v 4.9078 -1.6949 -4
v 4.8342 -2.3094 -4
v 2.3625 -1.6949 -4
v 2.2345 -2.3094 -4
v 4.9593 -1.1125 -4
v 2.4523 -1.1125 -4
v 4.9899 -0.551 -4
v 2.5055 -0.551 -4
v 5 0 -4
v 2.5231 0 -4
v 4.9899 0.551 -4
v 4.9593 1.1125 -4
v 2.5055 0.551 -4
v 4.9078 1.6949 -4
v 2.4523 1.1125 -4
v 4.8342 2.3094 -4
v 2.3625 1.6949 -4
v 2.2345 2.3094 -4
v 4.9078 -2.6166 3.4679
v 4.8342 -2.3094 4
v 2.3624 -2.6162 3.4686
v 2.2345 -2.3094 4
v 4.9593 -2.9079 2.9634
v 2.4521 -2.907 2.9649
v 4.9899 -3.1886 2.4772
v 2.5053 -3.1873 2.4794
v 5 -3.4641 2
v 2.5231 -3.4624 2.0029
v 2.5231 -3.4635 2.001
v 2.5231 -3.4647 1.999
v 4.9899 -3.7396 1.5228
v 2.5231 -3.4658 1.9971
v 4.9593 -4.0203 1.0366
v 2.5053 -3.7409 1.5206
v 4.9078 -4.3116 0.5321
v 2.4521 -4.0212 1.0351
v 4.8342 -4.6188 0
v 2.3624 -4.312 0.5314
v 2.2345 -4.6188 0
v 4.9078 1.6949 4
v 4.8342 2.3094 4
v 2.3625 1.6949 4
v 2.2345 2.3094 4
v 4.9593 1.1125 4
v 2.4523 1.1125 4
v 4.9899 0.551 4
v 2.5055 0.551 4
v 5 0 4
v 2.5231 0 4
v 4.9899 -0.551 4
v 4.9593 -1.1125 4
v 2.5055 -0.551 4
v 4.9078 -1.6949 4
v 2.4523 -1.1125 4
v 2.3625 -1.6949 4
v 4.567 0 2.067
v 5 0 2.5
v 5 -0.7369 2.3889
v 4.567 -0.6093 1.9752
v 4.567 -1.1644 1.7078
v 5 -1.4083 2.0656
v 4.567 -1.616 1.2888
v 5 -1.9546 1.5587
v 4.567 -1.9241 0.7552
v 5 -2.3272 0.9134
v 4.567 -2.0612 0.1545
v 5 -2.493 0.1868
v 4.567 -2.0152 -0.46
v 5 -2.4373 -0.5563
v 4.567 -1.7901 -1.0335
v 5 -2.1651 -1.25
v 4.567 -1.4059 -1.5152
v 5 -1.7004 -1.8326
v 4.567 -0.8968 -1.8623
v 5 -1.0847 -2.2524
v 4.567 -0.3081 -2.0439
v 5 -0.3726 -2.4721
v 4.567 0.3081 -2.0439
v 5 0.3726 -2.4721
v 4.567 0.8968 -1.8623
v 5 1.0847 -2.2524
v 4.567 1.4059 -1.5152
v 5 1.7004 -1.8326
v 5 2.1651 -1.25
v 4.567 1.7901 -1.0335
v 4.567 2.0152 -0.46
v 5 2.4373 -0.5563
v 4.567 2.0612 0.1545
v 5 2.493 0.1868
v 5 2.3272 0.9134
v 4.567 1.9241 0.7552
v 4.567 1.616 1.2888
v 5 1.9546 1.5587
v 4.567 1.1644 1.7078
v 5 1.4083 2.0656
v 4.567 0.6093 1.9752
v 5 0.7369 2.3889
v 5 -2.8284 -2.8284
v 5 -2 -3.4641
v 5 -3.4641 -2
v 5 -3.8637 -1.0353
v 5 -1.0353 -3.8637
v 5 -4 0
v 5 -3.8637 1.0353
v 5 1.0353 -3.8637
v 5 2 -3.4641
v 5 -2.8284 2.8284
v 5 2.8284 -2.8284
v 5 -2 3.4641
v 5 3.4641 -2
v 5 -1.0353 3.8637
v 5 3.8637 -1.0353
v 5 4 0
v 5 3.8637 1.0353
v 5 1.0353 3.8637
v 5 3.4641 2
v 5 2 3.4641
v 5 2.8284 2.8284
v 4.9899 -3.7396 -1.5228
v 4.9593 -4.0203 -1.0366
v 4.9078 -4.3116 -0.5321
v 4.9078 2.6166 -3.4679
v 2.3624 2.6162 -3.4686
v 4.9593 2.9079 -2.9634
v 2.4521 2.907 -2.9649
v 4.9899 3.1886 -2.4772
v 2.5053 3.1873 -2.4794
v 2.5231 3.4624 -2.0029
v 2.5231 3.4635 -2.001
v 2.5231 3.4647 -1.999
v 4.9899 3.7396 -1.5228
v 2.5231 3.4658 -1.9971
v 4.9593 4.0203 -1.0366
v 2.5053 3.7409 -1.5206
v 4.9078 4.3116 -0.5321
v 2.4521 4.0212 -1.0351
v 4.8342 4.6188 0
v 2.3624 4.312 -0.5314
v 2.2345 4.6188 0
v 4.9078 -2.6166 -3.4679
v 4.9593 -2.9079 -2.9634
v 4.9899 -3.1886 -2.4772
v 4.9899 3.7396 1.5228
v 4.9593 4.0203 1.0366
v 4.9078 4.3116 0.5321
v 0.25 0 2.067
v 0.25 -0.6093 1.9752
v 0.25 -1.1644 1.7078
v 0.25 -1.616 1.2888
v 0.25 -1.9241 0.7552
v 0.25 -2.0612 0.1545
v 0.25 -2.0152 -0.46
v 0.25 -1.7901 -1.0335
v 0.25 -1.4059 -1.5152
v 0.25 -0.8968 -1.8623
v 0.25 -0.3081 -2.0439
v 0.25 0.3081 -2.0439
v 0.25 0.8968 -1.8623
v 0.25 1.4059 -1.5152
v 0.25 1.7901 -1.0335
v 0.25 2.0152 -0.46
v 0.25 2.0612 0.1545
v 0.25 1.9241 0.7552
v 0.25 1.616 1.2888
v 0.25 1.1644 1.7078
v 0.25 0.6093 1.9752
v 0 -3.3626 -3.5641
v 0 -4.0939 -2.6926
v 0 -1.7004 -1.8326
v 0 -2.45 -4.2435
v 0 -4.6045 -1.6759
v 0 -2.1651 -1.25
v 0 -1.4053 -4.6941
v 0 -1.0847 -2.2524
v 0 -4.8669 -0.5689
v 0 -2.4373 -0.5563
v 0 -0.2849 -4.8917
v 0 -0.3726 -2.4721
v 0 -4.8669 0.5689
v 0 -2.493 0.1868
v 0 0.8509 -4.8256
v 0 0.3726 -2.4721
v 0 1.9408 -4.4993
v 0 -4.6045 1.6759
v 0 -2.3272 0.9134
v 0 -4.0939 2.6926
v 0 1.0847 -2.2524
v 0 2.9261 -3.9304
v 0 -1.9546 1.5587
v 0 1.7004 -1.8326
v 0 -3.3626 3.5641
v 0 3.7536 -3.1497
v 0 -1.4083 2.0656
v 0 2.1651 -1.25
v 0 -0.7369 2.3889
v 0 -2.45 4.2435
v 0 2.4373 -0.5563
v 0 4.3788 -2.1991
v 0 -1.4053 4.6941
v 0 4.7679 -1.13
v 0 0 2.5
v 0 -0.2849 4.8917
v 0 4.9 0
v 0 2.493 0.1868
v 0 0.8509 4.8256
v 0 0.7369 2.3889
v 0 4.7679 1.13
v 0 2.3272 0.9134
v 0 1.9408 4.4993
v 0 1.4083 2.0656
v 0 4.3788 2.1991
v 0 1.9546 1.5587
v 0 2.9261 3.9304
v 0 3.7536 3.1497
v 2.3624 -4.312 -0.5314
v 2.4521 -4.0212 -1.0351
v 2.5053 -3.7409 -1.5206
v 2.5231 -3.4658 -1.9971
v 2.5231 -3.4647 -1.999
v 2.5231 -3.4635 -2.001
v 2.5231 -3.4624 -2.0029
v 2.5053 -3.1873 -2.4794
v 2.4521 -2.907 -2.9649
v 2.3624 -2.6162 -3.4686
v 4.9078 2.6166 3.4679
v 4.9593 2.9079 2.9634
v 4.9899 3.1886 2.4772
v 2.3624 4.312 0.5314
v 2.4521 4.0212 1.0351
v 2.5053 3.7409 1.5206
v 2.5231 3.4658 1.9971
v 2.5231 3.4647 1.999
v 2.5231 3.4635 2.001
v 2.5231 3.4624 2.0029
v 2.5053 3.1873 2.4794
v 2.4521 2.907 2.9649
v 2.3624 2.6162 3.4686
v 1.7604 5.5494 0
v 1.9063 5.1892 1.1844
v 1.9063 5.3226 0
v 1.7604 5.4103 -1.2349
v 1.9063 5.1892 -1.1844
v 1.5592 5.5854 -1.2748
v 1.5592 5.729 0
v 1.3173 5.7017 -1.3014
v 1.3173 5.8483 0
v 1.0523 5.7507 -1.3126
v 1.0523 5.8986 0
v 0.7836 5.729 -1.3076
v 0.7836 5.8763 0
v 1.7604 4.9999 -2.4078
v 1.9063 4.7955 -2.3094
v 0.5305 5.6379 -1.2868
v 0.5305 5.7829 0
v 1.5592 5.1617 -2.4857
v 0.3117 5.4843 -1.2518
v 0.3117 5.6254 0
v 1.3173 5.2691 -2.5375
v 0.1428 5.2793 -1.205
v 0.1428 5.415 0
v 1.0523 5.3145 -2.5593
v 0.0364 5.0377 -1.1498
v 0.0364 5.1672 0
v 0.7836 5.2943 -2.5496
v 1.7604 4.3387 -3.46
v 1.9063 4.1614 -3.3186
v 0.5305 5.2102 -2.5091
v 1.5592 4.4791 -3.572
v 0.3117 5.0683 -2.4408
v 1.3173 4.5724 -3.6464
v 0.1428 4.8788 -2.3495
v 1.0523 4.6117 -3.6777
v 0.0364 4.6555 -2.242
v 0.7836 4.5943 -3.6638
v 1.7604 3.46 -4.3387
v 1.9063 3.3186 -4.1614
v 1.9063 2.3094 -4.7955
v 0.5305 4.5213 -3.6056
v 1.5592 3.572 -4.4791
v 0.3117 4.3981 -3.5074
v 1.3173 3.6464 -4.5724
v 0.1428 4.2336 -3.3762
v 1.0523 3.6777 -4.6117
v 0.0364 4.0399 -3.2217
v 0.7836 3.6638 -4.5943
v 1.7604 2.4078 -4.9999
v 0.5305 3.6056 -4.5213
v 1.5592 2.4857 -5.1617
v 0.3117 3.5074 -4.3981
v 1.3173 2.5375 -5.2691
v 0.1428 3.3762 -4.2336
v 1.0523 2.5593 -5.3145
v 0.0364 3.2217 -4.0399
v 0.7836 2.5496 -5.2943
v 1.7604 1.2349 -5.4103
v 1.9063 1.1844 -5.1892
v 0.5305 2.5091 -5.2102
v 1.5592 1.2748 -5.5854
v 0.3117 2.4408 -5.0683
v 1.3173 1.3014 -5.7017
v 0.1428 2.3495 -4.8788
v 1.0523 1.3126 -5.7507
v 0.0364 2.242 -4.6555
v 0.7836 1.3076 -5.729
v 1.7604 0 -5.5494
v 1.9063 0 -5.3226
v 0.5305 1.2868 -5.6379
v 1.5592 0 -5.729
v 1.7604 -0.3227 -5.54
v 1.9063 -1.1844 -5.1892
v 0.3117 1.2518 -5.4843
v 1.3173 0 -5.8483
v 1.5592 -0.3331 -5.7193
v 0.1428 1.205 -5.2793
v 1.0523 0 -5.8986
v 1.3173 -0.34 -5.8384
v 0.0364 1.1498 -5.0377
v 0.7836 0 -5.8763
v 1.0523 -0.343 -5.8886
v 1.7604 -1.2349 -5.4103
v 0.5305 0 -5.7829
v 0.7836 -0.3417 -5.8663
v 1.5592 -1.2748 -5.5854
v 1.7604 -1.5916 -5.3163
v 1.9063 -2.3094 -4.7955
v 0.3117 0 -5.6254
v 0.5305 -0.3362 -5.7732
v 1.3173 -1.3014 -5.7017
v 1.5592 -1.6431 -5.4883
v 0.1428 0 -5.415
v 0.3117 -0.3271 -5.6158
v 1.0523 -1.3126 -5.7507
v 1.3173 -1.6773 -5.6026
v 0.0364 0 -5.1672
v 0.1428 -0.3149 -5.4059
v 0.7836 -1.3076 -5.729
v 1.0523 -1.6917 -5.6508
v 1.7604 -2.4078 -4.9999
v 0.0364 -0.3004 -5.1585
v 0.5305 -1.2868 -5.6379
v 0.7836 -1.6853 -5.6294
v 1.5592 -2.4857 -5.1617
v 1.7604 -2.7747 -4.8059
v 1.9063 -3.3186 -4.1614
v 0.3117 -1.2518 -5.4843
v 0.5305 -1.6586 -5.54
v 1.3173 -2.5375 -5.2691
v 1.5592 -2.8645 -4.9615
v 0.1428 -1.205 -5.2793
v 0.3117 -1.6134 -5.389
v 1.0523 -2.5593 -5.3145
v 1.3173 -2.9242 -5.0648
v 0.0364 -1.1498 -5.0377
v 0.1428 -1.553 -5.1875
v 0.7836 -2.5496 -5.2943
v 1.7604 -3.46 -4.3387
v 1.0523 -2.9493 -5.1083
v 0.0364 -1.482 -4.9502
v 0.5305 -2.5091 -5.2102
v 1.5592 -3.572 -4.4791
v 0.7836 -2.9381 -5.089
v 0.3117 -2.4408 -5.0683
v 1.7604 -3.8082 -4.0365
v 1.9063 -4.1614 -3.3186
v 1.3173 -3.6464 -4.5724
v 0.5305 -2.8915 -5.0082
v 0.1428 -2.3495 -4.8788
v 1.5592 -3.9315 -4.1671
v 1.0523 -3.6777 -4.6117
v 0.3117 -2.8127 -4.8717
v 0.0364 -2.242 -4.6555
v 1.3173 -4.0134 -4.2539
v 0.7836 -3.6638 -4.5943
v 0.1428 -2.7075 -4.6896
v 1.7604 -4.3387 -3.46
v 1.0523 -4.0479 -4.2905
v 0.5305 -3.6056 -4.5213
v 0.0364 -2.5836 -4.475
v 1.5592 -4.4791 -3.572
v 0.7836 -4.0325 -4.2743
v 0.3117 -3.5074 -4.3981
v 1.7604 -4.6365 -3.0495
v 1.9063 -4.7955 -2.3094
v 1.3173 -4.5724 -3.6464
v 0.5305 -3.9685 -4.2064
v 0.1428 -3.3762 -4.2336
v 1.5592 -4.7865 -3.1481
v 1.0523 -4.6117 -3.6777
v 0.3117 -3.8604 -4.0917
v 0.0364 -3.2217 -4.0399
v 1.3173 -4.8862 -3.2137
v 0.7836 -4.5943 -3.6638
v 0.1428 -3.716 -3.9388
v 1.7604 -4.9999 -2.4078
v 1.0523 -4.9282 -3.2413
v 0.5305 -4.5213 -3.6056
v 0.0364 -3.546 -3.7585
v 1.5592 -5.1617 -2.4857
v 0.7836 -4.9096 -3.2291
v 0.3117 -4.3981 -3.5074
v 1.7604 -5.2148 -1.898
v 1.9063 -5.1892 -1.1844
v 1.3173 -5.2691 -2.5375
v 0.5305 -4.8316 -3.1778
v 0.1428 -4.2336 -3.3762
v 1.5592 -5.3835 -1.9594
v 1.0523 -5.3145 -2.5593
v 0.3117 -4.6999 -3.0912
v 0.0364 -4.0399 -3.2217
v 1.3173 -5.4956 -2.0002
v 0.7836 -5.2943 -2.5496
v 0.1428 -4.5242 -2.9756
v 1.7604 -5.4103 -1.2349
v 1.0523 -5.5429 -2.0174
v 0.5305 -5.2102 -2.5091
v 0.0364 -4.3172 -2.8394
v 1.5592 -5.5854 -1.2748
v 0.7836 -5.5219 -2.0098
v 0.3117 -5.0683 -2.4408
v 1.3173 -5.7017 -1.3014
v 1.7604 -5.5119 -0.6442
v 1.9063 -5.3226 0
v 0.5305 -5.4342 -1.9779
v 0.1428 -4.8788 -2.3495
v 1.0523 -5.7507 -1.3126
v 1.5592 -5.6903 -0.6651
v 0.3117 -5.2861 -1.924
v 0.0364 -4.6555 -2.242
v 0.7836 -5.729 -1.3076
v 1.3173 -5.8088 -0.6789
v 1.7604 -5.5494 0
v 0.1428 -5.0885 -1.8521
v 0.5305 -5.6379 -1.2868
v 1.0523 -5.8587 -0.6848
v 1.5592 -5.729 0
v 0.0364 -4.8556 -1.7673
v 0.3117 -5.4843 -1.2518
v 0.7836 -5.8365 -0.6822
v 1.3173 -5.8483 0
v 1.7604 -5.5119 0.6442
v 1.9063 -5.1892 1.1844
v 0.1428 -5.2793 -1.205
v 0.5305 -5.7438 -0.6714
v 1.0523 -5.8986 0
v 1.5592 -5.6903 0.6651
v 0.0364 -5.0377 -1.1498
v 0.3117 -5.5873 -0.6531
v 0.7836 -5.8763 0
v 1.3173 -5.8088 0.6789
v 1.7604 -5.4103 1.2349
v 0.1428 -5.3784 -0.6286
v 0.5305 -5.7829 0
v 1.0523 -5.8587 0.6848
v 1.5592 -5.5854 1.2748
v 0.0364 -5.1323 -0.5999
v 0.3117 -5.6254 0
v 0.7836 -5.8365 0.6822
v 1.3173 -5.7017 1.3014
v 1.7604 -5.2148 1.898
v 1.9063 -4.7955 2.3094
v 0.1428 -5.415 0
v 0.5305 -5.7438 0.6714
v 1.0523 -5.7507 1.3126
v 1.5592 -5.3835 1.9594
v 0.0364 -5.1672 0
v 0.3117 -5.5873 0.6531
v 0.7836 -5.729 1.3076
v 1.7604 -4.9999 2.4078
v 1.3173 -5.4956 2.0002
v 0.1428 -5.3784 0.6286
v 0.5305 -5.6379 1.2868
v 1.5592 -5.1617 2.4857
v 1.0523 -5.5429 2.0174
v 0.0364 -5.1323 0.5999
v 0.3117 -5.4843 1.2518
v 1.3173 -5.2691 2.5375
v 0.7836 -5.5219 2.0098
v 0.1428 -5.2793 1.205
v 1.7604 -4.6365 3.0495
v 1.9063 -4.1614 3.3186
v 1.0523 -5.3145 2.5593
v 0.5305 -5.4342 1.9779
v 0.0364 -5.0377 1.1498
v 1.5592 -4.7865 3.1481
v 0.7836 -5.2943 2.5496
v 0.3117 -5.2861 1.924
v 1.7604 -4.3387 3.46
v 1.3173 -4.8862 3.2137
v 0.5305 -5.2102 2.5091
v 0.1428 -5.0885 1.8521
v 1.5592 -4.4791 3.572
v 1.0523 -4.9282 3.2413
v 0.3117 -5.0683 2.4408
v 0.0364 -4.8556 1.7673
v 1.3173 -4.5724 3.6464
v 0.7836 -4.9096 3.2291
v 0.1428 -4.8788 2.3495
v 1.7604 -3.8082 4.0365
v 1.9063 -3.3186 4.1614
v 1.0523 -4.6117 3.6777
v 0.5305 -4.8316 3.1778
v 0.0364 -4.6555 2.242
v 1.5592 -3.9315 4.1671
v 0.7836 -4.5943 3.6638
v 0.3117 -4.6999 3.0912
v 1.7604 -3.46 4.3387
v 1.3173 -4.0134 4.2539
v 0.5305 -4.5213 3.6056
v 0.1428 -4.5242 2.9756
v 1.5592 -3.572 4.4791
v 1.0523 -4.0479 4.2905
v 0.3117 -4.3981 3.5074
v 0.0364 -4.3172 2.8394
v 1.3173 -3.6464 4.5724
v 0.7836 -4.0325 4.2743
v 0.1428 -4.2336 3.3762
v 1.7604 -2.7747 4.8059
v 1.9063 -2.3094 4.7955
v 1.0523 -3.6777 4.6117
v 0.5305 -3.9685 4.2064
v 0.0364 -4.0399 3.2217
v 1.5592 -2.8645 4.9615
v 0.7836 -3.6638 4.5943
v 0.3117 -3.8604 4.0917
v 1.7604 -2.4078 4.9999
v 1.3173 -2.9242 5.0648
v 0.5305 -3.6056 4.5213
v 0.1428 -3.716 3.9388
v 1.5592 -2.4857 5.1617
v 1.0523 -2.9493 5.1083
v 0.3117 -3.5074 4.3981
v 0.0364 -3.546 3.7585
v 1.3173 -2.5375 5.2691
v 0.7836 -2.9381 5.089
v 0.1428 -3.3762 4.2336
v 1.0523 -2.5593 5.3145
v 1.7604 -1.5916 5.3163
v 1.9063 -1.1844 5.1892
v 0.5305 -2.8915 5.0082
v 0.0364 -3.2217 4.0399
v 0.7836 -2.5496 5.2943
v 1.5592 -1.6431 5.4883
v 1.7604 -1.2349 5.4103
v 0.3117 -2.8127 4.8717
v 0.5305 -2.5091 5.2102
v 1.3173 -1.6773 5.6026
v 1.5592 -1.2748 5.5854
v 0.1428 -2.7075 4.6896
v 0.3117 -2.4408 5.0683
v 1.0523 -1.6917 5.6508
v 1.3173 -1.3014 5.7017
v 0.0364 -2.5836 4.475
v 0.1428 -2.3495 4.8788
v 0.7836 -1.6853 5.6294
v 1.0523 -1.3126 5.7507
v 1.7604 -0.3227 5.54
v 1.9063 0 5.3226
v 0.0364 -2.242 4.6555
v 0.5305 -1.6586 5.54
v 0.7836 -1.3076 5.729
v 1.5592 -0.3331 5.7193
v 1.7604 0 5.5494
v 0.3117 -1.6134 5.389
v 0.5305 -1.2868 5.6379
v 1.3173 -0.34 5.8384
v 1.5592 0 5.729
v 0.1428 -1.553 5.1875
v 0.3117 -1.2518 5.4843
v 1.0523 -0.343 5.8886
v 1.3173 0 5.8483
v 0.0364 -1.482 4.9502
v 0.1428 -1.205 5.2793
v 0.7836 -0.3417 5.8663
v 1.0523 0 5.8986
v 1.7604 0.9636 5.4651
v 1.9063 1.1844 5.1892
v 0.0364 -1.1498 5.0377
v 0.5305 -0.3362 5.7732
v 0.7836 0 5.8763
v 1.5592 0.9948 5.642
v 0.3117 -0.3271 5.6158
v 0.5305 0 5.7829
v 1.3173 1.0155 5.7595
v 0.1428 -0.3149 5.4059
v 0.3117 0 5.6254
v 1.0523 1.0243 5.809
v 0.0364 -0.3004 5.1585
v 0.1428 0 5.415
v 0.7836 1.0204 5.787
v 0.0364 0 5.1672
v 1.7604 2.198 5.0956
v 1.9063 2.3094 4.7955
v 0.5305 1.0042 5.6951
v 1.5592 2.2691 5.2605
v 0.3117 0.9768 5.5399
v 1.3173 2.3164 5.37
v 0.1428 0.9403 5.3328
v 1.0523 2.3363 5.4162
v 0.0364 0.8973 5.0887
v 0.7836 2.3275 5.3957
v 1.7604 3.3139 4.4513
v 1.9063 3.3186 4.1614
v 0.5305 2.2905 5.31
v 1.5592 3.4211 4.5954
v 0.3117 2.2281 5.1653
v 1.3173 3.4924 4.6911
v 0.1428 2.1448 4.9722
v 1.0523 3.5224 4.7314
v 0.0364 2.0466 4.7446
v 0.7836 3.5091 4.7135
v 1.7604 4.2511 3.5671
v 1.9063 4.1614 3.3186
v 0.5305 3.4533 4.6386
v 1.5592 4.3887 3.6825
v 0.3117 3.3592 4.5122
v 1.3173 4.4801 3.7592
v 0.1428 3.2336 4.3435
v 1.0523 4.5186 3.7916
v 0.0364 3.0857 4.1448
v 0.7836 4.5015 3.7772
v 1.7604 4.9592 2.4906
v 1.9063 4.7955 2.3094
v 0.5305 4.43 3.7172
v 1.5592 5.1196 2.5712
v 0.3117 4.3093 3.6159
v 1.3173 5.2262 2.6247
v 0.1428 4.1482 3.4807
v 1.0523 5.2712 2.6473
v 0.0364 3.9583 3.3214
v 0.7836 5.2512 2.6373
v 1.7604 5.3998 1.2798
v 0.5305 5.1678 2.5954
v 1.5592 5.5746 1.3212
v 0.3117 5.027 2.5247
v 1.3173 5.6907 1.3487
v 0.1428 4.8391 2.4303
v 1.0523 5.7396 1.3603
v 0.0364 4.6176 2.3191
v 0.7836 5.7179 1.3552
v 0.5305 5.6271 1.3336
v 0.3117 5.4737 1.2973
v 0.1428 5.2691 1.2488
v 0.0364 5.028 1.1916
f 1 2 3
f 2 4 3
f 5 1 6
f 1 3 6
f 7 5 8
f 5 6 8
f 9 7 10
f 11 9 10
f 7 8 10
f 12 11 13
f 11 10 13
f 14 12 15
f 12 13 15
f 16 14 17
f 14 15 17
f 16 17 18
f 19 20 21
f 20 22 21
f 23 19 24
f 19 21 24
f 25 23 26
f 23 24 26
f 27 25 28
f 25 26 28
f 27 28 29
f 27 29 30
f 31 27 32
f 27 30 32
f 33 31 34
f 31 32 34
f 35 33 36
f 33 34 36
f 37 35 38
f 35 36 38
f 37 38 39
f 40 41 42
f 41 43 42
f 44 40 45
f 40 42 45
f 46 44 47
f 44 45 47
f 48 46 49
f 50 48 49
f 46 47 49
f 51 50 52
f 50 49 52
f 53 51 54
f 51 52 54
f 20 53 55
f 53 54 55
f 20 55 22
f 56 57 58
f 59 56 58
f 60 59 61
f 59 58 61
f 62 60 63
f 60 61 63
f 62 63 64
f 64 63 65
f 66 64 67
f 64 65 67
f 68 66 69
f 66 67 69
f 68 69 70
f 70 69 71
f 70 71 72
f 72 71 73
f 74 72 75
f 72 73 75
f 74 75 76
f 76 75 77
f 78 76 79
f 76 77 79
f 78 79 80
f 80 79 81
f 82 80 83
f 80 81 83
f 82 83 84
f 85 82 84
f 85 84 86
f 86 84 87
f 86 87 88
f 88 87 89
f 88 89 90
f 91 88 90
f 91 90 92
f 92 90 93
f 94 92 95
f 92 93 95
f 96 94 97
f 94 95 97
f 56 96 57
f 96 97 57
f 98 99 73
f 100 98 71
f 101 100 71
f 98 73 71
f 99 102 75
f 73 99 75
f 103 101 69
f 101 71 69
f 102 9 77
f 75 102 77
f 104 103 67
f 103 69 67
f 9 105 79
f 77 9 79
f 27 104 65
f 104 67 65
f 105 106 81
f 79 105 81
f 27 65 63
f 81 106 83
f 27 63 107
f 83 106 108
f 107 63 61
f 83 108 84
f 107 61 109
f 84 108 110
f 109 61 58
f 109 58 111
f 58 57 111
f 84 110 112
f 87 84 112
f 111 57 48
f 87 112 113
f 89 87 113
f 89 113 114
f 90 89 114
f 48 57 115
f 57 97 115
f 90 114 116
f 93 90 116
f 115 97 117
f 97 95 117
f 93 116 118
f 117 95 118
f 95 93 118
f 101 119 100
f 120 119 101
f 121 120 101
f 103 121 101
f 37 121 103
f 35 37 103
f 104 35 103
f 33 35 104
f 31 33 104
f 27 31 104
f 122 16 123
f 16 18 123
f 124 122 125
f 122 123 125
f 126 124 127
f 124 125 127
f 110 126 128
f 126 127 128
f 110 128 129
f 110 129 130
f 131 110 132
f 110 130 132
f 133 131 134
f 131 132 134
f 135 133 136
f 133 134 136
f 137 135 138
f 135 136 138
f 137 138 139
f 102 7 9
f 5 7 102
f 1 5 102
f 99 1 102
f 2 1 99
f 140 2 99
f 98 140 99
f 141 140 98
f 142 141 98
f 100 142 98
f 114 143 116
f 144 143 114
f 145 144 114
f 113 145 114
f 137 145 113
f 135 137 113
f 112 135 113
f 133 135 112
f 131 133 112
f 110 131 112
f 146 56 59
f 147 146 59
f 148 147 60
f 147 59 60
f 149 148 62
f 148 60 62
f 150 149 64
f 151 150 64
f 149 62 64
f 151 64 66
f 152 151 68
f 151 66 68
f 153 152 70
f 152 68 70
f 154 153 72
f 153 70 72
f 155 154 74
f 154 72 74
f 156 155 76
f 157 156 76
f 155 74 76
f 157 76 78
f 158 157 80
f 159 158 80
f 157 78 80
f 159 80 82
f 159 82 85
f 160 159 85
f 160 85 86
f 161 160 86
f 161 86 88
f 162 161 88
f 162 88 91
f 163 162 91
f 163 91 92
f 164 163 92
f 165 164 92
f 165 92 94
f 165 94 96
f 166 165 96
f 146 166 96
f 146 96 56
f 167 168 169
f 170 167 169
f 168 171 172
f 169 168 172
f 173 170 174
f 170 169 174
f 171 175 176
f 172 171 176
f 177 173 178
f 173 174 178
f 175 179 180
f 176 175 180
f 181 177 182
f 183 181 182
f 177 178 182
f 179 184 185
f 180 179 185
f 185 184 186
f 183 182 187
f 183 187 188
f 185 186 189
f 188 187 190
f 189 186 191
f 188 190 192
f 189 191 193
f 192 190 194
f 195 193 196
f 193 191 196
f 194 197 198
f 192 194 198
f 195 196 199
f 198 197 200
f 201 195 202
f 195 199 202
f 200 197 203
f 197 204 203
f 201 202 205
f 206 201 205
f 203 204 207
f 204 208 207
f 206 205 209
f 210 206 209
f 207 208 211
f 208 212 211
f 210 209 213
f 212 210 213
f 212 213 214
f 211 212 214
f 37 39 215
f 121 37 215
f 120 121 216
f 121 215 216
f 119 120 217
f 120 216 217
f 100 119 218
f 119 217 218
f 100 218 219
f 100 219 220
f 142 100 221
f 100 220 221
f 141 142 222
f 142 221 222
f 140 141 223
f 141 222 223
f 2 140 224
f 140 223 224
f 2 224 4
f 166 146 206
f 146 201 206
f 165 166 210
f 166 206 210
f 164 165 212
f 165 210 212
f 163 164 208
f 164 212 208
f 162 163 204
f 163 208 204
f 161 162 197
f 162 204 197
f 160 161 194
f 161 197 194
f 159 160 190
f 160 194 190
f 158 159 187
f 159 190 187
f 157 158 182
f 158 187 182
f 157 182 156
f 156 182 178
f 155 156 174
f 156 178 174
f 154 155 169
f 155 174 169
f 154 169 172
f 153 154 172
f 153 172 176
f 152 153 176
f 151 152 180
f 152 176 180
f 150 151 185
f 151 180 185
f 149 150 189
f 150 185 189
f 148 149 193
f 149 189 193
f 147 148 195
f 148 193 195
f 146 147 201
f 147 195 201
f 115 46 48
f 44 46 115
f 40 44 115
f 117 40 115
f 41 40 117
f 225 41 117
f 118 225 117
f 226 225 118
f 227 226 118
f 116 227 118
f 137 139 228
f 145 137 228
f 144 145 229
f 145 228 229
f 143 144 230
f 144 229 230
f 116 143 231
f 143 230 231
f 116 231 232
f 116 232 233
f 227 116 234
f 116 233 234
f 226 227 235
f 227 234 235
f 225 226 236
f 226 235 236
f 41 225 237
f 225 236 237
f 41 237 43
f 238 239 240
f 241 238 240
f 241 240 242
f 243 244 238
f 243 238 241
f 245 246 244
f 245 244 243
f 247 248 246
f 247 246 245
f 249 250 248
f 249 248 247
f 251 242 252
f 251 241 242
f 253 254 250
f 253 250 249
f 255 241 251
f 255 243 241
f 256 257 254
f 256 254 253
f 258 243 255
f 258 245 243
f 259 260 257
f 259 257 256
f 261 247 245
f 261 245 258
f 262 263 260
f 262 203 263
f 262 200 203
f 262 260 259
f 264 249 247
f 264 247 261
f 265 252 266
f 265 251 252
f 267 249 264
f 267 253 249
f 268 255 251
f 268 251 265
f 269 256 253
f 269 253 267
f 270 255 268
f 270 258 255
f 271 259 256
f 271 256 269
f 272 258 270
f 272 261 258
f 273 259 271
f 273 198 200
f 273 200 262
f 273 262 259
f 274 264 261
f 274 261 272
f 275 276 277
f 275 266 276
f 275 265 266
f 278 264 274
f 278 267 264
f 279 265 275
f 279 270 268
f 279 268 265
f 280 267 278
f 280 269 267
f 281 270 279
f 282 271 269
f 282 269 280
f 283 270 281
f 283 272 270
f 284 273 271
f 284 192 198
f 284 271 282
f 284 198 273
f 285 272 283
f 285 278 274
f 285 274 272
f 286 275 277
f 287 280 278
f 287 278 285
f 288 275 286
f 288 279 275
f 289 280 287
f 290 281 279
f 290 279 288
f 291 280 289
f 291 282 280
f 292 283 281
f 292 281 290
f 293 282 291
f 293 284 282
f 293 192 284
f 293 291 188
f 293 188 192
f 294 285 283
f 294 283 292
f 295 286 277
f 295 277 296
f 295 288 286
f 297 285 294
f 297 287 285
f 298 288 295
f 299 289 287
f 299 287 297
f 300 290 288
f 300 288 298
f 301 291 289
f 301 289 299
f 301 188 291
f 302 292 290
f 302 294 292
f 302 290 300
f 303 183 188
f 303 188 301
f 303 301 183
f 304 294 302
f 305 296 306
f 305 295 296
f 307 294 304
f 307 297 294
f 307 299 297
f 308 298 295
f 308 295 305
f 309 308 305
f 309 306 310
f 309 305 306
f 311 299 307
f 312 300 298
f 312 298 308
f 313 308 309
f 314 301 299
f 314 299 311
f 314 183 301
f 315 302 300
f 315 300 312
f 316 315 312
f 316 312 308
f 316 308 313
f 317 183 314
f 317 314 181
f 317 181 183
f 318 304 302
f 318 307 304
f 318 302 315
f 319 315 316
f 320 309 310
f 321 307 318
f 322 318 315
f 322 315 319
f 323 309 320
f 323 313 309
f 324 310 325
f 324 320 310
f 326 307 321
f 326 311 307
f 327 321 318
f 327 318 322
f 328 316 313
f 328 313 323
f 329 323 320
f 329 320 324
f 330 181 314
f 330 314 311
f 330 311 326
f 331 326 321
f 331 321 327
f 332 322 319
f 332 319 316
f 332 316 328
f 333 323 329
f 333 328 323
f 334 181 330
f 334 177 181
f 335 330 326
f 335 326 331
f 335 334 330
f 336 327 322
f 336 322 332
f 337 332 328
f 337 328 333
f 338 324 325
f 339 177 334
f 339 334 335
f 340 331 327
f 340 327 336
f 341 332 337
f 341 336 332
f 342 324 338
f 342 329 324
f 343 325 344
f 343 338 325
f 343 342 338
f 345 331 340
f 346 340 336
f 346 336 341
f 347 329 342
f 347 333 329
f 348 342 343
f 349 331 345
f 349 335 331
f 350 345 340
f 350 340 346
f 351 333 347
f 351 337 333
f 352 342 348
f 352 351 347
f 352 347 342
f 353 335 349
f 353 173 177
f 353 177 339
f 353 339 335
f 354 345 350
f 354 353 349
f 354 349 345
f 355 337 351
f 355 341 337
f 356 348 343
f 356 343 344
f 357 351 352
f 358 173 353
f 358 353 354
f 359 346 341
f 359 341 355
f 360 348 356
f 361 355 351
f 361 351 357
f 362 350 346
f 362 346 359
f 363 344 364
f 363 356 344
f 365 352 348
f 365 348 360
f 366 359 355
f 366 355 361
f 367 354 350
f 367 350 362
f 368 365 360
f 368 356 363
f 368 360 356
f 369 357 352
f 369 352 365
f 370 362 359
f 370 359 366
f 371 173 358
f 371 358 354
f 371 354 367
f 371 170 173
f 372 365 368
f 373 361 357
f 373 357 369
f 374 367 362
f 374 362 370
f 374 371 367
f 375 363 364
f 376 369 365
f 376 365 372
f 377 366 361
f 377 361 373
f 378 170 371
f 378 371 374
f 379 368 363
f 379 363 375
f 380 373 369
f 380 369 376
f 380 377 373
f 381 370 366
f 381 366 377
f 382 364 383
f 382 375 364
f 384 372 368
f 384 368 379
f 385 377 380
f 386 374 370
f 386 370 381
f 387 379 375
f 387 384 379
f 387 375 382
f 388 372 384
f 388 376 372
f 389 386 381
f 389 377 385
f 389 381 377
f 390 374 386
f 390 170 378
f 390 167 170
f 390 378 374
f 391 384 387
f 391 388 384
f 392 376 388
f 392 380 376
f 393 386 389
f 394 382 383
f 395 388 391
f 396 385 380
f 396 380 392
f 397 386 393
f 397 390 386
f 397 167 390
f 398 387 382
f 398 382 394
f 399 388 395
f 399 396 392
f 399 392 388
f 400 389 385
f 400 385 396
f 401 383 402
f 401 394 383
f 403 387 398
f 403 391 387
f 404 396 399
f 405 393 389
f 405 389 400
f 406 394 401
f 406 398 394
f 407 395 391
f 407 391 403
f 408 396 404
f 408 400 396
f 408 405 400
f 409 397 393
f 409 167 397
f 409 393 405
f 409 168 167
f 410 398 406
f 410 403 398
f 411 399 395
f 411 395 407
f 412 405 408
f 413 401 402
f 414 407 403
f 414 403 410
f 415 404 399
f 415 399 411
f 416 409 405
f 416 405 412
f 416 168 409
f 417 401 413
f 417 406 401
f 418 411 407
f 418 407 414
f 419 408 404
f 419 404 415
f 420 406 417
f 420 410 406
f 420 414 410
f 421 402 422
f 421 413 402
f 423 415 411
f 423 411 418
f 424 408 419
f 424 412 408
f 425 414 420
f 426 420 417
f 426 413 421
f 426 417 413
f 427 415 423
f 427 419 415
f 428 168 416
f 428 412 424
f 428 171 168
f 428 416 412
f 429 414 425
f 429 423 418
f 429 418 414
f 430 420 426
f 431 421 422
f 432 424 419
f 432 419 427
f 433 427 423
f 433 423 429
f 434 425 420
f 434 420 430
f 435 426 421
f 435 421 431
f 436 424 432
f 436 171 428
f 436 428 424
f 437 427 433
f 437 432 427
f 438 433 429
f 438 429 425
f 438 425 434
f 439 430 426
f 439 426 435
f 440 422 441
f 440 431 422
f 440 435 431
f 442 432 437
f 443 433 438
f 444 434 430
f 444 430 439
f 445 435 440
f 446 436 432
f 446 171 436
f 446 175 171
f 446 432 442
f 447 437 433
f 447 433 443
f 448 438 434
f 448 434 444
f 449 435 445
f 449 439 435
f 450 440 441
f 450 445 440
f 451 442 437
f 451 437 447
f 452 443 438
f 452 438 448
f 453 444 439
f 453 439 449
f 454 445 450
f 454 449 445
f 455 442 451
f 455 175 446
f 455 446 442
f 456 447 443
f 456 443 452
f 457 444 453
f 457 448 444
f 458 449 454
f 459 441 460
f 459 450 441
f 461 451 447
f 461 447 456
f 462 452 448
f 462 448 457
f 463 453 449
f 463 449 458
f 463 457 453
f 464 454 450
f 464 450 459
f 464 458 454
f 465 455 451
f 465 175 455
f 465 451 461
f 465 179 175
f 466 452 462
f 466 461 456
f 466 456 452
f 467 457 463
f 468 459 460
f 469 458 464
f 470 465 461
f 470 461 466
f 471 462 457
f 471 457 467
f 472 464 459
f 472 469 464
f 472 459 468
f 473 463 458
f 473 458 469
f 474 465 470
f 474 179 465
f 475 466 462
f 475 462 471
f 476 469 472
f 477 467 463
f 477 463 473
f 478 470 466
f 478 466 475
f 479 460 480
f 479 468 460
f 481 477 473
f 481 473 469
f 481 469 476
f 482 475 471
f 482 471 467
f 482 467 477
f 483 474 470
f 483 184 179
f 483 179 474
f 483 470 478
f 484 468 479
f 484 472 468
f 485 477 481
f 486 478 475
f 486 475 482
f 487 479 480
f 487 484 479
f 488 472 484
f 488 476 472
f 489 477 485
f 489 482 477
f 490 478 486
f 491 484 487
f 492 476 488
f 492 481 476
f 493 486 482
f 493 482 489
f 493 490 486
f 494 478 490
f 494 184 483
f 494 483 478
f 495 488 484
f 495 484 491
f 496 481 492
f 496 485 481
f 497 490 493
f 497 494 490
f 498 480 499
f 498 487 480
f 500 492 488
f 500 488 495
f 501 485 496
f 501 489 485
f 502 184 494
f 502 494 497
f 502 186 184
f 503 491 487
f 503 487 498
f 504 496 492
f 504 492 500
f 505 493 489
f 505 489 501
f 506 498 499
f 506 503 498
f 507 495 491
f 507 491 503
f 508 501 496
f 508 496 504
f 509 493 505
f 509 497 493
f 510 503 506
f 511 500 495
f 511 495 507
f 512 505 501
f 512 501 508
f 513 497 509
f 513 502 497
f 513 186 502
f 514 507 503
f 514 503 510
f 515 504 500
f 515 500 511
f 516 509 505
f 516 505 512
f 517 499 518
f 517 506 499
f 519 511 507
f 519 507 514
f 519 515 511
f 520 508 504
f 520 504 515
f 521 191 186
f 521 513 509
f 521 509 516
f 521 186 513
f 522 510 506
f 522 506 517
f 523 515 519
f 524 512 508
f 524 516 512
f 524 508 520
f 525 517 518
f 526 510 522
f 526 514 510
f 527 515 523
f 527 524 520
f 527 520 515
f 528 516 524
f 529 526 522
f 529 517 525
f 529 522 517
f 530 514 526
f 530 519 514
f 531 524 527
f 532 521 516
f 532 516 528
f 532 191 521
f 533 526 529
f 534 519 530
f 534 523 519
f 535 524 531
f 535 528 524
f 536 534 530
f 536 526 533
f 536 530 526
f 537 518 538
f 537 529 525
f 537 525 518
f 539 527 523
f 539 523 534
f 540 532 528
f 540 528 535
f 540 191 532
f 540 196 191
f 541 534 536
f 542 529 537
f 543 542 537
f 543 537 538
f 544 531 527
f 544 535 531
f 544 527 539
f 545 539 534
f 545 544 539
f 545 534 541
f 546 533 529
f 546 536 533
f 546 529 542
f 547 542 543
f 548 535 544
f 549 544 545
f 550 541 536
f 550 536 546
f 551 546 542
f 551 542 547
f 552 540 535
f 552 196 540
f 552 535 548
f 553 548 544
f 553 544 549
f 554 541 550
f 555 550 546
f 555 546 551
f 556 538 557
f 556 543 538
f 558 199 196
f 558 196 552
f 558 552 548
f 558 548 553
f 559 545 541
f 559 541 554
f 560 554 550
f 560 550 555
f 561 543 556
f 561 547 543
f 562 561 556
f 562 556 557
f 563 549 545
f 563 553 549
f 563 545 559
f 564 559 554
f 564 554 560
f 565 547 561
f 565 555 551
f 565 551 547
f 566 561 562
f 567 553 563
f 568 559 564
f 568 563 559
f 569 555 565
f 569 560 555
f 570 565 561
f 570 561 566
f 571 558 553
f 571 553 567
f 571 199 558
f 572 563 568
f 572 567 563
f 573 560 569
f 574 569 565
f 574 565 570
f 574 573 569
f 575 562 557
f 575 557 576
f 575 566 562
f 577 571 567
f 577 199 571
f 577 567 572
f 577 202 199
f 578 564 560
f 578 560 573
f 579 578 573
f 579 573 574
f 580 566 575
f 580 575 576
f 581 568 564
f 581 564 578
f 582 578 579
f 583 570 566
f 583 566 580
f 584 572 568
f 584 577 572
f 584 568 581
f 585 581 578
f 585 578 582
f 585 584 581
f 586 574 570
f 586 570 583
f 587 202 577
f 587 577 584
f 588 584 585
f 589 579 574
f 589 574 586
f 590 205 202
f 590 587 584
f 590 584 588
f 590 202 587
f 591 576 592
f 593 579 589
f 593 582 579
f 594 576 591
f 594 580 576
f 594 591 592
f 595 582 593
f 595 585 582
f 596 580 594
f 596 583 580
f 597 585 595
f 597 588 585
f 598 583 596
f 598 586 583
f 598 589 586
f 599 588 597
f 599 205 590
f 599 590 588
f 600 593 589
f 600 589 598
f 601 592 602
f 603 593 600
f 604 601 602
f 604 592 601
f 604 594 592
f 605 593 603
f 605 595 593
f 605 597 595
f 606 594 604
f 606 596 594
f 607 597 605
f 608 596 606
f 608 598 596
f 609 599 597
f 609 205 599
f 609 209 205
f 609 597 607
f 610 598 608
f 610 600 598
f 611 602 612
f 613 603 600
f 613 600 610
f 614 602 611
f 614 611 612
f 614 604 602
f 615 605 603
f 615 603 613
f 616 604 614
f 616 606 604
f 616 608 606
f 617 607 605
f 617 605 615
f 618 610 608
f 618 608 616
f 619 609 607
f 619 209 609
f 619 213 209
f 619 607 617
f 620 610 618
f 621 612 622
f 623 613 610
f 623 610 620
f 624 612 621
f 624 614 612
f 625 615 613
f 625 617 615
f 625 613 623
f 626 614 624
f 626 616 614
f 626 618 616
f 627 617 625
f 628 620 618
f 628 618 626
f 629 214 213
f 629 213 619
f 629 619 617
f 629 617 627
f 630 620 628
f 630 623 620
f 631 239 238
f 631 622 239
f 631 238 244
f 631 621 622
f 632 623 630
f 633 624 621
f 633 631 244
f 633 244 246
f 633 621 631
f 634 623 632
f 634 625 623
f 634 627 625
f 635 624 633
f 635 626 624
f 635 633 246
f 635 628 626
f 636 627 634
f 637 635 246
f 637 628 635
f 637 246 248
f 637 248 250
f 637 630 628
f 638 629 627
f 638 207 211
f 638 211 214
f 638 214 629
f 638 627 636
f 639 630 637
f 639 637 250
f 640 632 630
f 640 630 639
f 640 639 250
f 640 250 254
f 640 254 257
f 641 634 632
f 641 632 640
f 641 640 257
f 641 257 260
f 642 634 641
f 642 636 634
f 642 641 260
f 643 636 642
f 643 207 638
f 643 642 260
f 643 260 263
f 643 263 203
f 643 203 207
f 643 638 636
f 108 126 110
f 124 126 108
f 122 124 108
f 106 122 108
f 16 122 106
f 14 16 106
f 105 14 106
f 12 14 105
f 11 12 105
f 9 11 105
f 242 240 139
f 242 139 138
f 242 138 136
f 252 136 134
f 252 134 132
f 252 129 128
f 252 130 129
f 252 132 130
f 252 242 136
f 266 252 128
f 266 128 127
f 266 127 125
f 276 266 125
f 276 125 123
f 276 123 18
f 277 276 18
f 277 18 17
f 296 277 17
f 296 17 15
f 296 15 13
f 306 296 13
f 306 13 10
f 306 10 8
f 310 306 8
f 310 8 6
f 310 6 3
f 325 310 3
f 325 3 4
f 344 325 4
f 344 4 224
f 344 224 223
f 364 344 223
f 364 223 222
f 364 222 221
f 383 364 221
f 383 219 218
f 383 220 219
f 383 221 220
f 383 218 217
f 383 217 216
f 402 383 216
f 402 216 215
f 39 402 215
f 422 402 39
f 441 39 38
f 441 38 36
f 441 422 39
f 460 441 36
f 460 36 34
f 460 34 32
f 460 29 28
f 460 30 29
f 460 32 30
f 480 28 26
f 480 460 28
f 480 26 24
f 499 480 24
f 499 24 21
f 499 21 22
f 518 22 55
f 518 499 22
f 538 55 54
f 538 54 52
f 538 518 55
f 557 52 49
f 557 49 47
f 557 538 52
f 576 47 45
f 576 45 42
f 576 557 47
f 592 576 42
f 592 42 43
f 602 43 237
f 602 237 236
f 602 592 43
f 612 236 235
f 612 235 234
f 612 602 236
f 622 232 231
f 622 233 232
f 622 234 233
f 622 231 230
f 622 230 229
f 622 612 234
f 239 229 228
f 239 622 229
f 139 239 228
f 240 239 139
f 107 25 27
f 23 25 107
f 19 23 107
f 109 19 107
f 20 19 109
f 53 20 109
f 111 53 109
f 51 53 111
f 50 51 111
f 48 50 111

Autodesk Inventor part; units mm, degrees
ref_plane "YZ Plane" through (0, 0, 0) normal (1, 0, 0) x (0, 1, 0)
ref_plane "XZ Plane" through (0, 0, 0) normal (0, 1, 0) x (-1, 0, 0)
sketch "Эскиз1" plane through (0, 0, 0) normal (0, 0, 1) x (1, 0, 0)
  line L0 (-1.2035, 0) -> (6.0339, 0) projected
  line L1 (2.5231, 4) -> (1.9063, 5.3226)
  line L2 (2.5231, 4) -> (5, 4) construction
  line L3 (5, 4) -> (5, 0) construction
  arc A0 (1.9063, 5.3226) -> (0, 4.9) centre (1, 4.9) ccw
  line L4 (2.5231, 4) -> (2.5231, 0)
  line L5 (0, -1.2175) -> (0, 7.3051) projected
  point P0 (0, 0)
  dimension "d2" = 8
  dimension "d4" = 11.8
  dimension "d5" = 1
  dimension "d15" = 5
  dimension "d16" = 25
revolve "Кольцо" add sketch "Эскиз1" angle 360 about axis through (-10, 0, 0) along (1, 0, 0)
sketch "Эскиз2" plane through (0, 0, 0) normal (-1, 0, 0) x (0, 0, 1)
  circle A0 centre (0, 0) radius 4.9
  line L0 (-4, -2.3094) -> (-4, 2.3094)
  line L1 (-4, 2.3094) -> (0, 4.6188)
  line L2 (0, 4.6188) -> (4, 2.3094)
  line L3 (4, 2.3094) -> (4, -2.3094)
  line L4 (4, -2.3094) -> (0, -4.6188)
  line L5 (0, -4.6188) -> (-4, -2.3094)
  circle A1 centre (0, 0) radius 4.9 projected
  dimension "d6" = 9.2376
extrude "Базовый элемент" add sketch "Эскиз2" against normal blind 5 contours L0 L1 L2 L3 L4 L5
sketch "Эскиз3" plane through (0, 0, 0) normal (0, 0, 1) x (1, 0, 0)
  line L0 (2.2345, 4.6188) -> (5, 4.6188) projected
  line L1 (5, 2.3094) -> (5, 4.6188) projected
  line L2 (0, -4.9) -> (0, 4.9) projected
  line L3 (-1, 0) -> (6, 0) projected
  line L4 (4.8342, 4.6188) -> (5, 4)
  dimension "d10" = 15
  dimension "d11" = 8
revolve "Фаска1" cut sketch "Эскиз3" angle 360 about axis through (-10, 0, 0) along (1, 0, 0)
sketch "Эскиз4" plane through (0, 0, 0) normal (-1, 0, 0) x (0, 0, 1)
  circle A0 centre (0, 0) radius 4.9 projected
hole "Резьба" at (0, 0, 0) direction (1, 0, 0) diameter 4.134 end through all thread size "M5x0.8" class "6H" standard "ISO Metric profile"
chamfer "Фаска2" distance 0.433 angle 30 1 edges at (0, 0, -2.067) measured on face at (0, 3.9032, -0.4739)
ref_plane "Work Plane1" through (17.4207, 0, 0) normal (0, 0, -1) x (-1, 0, 0)
chamfer "Фаска3" distance 0.433 angle 45 1 edges at (5, 0, -2.067)
equation "\"d6\" = 1.1547 * SW"
equation "\"d7\" = KOH"
equation "\"d12\" = -0.5 * GD1 + 0.5 * NND"
equation "\"d46\" = -0.5 * GD1 + 0.5 * NND"
equation "\"d51\" = -0.5 * GD1 + 0.5 * NND"
equation "\"d2\" = SW"
equation "\"d4\" = LADI"
equation "\"d5\" = PHH"
equation "\"d15\" = KOH"
equation "\"d16\" = KEWI"
equation "\"d10\" = ANG1"
equation "\"d11\" = SW0"
equation "\"ANG1\" = 15deg"
equation "\"KEWI\" = 25deg"
equation "\"NND\" = 5"
equation "\"LADI\" = 11.8"
equation "\"SW\" = 8"
equation "\"PHH\" = RR"
equation "\"KOH\" = NND"
equation "\"SW0\" = SW"
equation "\"d1\" = LADI"
equation "\"d3\" = PHH"
equation "\"GUL\" = 0.541266 * PTC"
equation "\"RR\" = 1"
equation "\"THREADDIA\" = 5"
equation "\"TOA\" = 30deg"
equation "\"PTC\" = 0.8"
equation "\"GAL\" = 0.541266 * PTC"
equation "\"E0\" = 1.155 * SW"
equation "\"GD1\" = 4.133975"
properties part number "DIN 6923 - M5" material "Сталь, мягкая"
